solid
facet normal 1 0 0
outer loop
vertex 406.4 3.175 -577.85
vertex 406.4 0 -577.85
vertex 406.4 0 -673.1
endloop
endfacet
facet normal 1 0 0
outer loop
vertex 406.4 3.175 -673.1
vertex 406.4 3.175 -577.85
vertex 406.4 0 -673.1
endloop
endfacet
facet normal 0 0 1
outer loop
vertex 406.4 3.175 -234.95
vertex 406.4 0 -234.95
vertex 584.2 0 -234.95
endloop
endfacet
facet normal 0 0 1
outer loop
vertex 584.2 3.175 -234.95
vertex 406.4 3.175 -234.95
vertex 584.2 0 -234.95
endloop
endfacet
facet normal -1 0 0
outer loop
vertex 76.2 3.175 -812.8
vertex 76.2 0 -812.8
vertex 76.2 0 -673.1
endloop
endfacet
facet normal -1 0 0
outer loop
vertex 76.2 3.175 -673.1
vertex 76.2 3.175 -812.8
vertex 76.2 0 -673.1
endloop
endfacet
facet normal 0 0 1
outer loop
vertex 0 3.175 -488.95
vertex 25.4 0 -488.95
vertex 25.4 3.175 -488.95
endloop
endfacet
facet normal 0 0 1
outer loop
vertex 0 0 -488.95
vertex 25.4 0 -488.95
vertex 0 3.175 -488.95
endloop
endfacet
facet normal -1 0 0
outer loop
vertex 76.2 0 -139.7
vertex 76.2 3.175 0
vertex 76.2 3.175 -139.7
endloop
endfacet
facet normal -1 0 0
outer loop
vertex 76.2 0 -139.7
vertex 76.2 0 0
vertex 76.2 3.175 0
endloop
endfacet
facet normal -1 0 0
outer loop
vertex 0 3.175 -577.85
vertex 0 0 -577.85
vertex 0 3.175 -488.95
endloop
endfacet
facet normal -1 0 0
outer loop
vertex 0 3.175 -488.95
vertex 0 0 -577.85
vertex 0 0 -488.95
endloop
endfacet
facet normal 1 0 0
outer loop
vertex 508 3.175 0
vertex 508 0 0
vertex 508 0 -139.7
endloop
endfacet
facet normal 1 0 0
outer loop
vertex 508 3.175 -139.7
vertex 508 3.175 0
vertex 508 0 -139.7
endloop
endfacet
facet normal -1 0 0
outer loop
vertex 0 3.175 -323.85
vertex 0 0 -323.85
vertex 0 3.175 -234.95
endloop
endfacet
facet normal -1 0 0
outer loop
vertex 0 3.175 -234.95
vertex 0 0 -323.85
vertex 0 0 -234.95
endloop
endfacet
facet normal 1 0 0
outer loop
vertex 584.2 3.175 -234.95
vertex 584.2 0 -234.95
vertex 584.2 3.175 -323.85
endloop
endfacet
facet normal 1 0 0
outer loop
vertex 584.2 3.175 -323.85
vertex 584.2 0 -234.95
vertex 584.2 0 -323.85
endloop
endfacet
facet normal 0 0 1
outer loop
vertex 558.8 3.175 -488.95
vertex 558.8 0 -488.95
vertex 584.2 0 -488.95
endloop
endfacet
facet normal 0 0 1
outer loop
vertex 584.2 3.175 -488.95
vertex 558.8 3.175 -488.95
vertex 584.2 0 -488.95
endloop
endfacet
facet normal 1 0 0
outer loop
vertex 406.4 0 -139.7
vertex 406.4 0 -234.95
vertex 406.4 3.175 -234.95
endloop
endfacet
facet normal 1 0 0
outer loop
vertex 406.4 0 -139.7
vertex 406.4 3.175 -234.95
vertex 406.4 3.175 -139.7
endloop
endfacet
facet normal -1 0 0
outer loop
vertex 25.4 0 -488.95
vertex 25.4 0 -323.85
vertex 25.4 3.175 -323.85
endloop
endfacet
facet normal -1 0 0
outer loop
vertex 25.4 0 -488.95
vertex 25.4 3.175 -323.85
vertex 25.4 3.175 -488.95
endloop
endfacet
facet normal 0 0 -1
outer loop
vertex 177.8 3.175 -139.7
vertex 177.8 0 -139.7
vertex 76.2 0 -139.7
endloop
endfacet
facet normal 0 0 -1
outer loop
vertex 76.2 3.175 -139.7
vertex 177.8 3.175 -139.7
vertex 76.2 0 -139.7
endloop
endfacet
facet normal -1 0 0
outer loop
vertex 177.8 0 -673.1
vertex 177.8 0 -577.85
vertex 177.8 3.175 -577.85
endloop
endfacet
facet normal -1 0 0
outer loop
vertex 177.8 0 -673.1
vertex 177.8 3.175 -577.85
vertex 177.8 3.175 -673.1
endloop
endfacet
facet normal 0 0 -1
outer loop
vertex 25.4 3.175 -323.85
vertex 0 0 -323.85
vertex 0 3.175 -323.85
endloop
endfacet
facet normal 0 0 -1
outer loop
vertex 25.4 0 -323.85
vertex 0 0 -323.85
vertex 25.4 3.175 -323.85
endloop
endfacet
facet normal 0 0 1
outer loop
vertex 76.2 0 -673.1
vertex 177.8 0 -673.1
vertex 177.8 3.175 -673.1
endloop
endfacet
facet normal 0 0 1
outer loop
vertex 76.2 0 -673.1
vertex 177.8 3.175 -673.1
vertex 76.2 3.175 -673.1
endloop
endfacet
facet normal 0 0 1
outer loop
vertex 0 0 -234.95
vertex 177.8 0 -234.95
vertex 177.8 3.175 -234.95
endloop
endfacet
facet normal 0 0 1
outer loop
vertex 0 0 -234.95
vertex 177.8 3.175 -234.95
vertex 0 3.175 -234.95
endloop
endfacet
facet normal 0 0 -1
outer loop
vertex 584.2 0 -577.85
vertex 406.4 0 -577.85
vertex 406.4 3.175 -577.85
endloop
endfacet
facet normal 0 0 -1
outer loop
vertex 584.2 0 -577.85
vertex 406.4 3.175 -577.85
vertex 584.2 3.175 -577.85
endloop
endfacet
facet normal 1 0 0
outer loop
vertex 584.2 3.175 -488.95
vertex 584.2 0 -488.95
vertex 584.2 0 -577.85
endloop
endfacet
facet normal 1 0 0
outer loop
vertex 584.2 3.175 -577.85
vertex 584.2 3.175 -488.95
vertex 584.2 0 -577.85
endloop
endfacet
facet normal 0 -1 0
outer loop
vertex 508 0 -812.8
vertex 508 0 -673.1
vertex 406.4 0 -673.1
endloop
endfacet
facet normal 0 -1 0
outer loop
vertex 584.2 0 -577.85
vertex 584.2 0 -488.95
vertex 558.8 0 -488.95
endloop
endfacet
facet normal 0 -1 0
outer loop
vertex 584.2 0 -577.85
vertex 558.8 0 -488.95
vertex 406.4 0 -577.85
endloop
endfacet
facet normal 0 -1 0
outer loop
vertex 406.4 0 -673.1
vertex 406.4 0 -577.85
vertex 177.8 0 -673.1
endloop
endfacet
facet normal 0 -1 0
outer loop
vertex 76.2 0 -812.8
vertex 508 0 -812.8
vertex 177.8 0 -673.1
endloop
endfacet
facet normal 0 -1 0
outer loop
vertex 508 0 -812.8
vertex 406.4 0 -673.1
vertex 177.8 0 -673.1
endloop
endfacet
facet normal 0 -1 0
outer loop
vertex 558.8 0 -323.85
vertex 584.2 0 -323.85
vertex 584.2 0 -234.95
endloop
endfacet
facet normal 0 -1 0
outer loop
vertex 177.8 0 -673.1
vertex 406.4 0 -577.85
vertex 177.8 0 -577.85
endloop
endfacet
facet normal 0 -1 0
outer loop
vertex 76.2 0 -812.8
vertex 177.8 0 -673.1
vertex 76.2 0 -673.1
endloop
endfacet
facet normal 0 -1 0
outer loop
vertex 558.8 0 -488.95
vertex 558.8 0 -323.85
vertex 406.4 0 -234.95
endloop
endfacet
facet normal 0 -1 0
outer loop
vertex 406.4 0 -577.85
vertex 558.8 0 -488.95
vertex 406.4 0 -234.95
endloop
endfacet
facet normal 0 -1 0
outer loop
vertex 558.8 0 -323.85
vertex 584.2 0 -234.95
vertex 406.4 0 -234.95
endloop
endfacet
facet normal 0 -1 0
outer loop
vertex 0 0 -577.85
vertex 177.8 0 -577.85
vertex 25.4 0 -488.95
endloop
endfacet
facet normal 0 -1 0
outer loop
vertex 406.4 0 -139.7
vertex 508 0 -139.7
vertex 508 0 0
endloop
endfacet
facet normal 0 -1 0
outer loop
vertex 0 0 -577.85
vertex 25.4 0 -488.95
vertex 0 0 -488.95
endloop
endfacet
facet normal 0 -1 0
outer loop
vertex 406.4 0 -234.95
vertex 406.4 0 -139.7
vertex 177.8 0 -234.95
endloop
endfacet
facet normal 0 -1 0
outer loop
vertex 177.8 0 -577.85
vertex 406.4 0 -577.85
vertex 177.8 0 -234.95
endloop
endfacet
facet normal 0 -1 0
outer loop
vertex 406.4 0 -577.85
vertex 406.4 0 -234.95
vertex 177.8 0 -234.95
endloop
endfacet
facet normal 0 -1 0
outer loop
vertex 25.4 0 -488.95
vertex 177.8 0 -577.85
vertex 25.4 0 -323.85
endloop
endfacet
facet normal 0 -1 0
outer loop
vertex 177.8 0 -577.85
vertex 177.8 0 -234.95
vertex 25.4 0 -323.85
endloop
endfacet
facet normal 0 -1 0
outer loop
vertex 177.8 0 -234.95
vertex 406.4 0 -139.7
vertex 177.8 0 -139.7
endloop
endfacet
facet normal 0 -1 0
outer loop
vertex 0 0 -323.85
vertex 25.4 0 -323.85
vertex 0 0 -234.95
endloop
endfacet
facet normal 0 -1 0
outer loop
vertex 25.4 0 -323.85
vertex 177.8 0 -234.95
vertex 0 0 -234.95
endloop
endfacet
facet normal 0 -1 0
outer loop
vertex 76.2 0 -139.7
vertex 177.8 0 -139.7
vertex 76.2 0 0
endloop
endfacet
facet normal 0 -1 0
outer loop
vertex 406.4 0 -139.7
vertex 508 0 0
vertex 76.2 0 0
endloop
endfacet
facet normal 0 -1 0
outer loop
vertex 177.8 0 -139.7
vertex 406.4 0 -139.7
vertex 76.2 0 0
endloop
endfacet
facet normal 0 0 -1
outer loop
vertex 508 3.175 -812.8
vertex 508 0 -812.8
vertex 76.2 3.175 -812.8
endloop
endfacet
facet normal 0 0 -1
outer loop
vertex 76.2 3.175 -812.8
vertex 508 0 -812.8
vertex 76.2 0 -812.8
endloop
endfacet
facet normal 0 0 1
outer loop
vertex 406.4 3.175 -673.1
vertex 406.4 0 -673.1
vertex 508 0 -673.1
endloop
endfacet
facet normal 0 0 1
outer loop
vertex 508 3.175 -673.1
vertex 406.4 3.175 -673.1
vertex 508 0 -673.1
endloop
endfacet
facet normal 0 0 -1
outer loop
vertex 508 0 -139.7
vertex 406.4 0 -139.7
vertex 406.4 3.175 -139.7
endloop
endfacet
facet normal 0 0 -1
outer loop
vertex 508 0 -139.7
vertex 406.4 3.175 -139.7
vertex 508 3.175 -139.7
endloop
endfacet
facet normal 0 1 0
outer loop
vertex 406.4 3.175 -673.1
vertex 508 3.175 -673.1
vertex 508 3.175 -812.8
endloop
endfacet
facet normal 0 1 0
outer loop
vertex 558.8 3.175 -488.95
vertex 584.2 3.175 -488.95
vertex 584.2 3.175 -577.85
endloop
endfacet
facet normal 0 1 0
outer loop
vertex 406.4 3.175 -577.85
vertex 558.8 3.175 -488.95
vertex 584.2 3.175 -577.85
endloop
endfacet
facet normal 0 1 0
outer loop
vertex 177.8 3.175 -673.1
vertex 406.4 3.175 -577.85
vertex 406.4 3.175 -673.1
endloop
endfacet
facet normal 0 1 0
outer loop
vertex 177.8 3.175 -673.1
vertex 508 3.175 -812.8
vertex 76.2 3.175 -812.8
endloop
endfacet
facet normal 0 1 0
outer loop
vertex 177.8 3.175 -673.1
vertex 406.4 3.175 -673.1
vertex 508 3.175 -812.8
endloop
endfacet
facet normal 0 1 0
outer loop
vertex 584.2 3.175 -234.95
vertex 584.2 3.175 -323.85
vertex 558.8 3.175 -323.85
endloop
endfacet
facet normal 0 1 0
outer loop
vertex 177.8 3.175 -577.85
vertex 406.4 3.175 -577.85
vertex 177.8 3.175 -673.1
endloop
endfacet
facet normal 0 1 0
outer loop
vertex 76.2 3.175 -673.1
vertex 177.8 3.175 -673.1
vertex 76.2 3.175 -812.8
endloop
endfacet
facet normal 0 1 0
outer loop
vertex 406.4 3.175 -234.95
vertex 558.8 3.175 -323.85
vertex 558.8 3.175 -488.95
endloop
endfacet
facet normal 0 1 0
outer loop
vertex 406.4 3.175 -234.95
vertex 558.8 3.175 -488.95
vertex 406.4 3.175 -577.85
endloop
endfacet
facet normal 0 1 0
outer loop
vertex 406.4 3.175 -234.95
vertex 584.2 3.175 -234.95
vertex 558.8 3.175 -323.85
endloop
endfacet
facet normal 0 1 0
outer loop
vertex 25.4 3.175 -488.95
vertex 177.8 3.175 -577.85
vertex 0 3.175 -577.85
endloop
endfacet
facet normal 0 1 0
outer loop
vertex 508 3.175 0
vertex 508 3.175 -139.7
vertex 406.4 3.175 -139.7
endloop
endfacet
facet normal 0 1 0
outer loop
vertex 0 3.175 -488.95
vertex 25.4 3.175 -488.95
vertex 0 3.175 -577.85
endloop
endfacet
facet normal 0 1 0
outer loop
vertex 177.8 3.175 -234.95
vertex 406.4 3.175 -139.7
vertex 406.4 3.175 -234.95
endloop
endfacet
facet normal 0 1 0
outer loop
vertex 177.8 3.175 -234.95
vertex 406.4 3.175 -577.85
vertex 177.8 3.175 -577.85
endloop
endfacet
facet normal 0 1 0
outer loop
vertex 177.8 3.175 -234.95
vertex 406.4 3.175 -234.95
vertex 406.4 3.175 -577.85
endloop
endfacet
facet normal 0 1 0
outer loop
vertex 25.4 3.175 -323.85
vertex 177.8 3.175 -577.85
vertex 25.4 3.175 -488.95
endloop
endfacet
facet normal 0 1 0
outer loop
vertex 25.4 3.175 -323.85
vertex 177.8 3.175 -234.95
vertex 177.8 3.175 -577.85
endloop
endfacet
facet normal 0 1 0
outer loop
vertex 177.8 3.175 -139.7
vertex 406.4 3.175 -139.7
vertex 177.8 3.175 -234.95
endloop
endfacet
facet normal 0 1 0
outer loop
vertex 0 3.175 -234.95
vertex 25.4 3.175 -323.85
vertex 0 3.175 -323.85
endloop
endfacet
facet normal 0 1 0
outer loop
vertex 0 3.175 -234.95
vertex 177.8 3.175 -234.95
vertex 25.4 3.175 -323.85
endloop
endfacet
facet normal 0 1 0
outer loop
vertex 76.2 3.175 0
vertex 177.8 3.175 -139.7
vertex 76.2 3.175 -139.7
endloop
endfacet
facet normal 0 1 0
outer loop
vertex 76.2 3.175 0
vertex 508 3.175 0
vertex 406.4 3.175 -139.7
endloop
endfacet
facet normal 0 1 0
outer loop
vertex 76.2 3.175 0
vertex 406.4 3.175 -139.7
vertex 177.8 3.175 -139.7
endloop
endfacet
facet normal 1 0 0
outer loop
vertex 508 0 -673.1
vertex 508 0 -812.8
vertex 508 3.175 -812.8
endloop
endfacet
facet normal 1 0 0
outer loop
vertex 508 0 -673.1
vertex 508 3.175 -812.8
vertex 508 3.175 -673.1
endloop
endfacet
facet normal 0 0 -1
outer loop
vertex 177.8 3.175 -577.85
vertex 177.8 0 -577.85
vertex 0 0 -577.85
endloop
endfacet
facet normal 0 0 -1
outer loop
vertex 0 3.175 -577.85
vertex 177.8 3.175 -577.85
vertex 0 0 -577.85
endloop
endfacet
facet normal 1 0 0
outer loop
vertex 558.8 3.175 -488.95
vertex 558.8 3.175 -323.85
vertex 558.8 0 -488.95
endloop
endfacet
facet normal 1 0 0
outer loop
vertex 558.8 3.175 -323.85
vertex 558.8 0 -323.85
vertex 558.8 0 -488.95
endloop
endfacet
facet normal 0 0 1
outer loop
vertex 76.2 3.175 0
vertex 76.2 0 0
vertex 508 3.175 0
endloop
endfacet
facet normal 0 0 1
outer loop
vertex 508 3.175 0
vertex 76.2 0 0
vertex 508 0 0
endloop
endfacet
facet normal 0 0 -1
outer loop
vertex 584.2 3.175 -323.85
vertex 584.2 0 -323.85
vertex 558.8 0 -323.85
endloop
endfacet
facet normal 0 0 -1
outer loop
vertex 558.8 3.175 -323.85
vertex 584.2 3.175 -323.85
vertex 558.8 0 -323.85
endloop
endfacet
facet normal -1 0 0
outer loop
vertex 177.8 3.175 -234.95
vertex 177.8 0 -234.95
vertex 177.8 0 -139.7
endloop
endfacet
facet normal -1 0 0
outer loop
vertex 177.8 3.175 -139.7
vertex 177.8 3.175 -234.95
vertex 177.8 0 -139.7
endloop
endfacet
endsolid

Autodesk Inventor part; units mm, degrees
ref_plane "YZ Plane" through (0, 0, 0) normal (1, 0, 0) x (0, 1, 0)
ref_plane "XZ Plane" through (0, 0, 0) normal (0, 1, 0) x (-1, 0, 0)
ref_plane "XY Plane" through (0, 0, 0) normal (0, 0, 1) x (1, 0, 0)
sketch "Sketch1" plane through (0, 0, 0) normal (0, 1, 0) x (-1, 0, 0)
  line L0 (0, 0) -> (-584.2, 0)
  line L1 (-584.2, 0) -> (-584.2, -812.8)
  line L2 (-584.2, -812.8) -> (0, -812.8)
  line L3 (0, -812.8) -> (0, 0)
  dimension "d0" = 584.2
  dimension "d1" = 812.8
extrude "Extrusion1" add sketch "Sketch1" along normal blind 3.175
sketch "Sketch2" plane through (0, 0, 0) normal (0, -1, 0) x (1, 0, 0)
  line L0 (0, 0) -> (584.2, 0) projected
  line L1 (0, -812.8) -> (0, 0) projected
  line L2 (584.2, -812.8) -> (0, -812.8) projected
  line L3 (584.2, 0) -> (584.2, -812.8) projected
  line L4 (584.2, 0) -> (584.2, -812.8) projected
  line L5 (584.2, -323.85) -> (558.8, -323.85)
  line L6 (558.8, -323.85) -> (558.8, -488.95)
  line L7 (558.8, -488.95) -> (584.2, -488.95)
  line L8 (584.2, -488.95) -> (584.2, -323.85)
  line L9 (0, -812.8) -> (0, 0) projected
  line L10 (0, -323.85) -> (25.4, -323.85)
  line L11 (25.4, -323.85) -> (25.4, -488.95)
  line L12 (25.4, -488.95) -> (0, -488.95)
  line L13 (0, -488.95) -> (0, -323.85)
  line L14 (584.2, 0) -> (508, 0)
  line L15 (508, 0) -> (508, -234.95)
  line L16 (508, -234.95) -> (584.2, -234.95)
  line L17 (584.2, -234.95) -> (584.2, 0)
  line L18 (0, 0) -> (76.2, 0)
  line L19 (76.2, 0) -> (76.2, -234.95)
  line L20 (76.2, -234.95) -> (0, -234.95)
  line L21 (0, -234.95) -> (0, 0)
  line L22 (0, -812.8) -> (76.2, -812.8)
  line L23 (76.2, -812.8) -> (76.2, -577.85)
  line L24 (76.2, -577.85) -> (0, -577.85)
  line L25 (0, -577.85) -> (0, -812.8)
  line L26 (584.2, -812.8) -> (508, -812.8)
  line L27 (508, -812.8) -> (508, -577.85)
  line L28 (508, -577.85) -> (584.2, -577.85)
  line L29 (584.2, -577.85) -> (584.2, -812.8)
  line L30 (508, -234.95) -> (406.4, -234.95)
  line L31 (406.4, -234.95) -> (406.4, -139.7)
  line L32 (406.4, -139.7) -> (508, -139.7)
  line L33 (508, -139.7) -> (508, -234.95)
  line L34 (508, -577.85) -> (406.4, -577.85)
  line L35 (406.4, -577.85) -> (406.4, -673.1)
  line L36 (406.4, -673.1) -> (508, -673.1)
  line L37 (508, -673.1) -> (508, -577.85)
  line L38 (76.2, -577.85) -> (177.8, -577.85)
  line L39 (177.8, -577.85) -> (177.8, -673.1)
  line L40 (177.8, -673.1) -> (76.2, -673.1)
  line L41 (76.2, -673.1) -> (76.2, -577.85)
  line L42 (76.2, -234.95) -> (177.8, -234.95)
  line L43 (177.8, -234.95) -> (177.8, -139.7)
  line L44 (177.8, -139.7) -> (76.2, -139.7)
  line L45 (76.2, -139.7) -> (76.2, -234.95)
  dimension "d4" = 165.1
  dimension "d5" = 165.1
  dimension "d6" = 25.4
  dimension "d7" = 25.4
  dimension "d8" = 323.85
  dimension "d9" = 323.85
  dimension "d10" = 76.2
  dimension "d11" = 234.95
  dimension "d12" = 76.2
  dimension "d13" = 234.95
  dimension "d14" = 76.2
  dimension "d15" = 234.95
  dimension "d16" = 76.2
  dimension "d17" = 234.95
  dimension "d18" = 101.6
  dimension "d19" = 95.25
  dimension "d20" = 101.6
  dimension "d21" = 95.25
  dimension "d22" = 101.6
  dimension "d23" = 95.25
  dimension "d24" = 101.6
  dimension "d25" = 95.25
extrude "Extrusion2" cut sketch "Sketch2" against normal blind 3.175 contours L0 L19 L20 L1 | L0 L3 L16 L15 | L44 L43 L42 L19 | L10 L11 L12 L1 | L15 L30 L31 L32 | L24 L23 L2 L1 | L3 L7 L6 L5 | L38 L39 L40 L23 | L3 L2 L27 L28 | L27 L36 L35 L34
properties part number "polycarb base"
